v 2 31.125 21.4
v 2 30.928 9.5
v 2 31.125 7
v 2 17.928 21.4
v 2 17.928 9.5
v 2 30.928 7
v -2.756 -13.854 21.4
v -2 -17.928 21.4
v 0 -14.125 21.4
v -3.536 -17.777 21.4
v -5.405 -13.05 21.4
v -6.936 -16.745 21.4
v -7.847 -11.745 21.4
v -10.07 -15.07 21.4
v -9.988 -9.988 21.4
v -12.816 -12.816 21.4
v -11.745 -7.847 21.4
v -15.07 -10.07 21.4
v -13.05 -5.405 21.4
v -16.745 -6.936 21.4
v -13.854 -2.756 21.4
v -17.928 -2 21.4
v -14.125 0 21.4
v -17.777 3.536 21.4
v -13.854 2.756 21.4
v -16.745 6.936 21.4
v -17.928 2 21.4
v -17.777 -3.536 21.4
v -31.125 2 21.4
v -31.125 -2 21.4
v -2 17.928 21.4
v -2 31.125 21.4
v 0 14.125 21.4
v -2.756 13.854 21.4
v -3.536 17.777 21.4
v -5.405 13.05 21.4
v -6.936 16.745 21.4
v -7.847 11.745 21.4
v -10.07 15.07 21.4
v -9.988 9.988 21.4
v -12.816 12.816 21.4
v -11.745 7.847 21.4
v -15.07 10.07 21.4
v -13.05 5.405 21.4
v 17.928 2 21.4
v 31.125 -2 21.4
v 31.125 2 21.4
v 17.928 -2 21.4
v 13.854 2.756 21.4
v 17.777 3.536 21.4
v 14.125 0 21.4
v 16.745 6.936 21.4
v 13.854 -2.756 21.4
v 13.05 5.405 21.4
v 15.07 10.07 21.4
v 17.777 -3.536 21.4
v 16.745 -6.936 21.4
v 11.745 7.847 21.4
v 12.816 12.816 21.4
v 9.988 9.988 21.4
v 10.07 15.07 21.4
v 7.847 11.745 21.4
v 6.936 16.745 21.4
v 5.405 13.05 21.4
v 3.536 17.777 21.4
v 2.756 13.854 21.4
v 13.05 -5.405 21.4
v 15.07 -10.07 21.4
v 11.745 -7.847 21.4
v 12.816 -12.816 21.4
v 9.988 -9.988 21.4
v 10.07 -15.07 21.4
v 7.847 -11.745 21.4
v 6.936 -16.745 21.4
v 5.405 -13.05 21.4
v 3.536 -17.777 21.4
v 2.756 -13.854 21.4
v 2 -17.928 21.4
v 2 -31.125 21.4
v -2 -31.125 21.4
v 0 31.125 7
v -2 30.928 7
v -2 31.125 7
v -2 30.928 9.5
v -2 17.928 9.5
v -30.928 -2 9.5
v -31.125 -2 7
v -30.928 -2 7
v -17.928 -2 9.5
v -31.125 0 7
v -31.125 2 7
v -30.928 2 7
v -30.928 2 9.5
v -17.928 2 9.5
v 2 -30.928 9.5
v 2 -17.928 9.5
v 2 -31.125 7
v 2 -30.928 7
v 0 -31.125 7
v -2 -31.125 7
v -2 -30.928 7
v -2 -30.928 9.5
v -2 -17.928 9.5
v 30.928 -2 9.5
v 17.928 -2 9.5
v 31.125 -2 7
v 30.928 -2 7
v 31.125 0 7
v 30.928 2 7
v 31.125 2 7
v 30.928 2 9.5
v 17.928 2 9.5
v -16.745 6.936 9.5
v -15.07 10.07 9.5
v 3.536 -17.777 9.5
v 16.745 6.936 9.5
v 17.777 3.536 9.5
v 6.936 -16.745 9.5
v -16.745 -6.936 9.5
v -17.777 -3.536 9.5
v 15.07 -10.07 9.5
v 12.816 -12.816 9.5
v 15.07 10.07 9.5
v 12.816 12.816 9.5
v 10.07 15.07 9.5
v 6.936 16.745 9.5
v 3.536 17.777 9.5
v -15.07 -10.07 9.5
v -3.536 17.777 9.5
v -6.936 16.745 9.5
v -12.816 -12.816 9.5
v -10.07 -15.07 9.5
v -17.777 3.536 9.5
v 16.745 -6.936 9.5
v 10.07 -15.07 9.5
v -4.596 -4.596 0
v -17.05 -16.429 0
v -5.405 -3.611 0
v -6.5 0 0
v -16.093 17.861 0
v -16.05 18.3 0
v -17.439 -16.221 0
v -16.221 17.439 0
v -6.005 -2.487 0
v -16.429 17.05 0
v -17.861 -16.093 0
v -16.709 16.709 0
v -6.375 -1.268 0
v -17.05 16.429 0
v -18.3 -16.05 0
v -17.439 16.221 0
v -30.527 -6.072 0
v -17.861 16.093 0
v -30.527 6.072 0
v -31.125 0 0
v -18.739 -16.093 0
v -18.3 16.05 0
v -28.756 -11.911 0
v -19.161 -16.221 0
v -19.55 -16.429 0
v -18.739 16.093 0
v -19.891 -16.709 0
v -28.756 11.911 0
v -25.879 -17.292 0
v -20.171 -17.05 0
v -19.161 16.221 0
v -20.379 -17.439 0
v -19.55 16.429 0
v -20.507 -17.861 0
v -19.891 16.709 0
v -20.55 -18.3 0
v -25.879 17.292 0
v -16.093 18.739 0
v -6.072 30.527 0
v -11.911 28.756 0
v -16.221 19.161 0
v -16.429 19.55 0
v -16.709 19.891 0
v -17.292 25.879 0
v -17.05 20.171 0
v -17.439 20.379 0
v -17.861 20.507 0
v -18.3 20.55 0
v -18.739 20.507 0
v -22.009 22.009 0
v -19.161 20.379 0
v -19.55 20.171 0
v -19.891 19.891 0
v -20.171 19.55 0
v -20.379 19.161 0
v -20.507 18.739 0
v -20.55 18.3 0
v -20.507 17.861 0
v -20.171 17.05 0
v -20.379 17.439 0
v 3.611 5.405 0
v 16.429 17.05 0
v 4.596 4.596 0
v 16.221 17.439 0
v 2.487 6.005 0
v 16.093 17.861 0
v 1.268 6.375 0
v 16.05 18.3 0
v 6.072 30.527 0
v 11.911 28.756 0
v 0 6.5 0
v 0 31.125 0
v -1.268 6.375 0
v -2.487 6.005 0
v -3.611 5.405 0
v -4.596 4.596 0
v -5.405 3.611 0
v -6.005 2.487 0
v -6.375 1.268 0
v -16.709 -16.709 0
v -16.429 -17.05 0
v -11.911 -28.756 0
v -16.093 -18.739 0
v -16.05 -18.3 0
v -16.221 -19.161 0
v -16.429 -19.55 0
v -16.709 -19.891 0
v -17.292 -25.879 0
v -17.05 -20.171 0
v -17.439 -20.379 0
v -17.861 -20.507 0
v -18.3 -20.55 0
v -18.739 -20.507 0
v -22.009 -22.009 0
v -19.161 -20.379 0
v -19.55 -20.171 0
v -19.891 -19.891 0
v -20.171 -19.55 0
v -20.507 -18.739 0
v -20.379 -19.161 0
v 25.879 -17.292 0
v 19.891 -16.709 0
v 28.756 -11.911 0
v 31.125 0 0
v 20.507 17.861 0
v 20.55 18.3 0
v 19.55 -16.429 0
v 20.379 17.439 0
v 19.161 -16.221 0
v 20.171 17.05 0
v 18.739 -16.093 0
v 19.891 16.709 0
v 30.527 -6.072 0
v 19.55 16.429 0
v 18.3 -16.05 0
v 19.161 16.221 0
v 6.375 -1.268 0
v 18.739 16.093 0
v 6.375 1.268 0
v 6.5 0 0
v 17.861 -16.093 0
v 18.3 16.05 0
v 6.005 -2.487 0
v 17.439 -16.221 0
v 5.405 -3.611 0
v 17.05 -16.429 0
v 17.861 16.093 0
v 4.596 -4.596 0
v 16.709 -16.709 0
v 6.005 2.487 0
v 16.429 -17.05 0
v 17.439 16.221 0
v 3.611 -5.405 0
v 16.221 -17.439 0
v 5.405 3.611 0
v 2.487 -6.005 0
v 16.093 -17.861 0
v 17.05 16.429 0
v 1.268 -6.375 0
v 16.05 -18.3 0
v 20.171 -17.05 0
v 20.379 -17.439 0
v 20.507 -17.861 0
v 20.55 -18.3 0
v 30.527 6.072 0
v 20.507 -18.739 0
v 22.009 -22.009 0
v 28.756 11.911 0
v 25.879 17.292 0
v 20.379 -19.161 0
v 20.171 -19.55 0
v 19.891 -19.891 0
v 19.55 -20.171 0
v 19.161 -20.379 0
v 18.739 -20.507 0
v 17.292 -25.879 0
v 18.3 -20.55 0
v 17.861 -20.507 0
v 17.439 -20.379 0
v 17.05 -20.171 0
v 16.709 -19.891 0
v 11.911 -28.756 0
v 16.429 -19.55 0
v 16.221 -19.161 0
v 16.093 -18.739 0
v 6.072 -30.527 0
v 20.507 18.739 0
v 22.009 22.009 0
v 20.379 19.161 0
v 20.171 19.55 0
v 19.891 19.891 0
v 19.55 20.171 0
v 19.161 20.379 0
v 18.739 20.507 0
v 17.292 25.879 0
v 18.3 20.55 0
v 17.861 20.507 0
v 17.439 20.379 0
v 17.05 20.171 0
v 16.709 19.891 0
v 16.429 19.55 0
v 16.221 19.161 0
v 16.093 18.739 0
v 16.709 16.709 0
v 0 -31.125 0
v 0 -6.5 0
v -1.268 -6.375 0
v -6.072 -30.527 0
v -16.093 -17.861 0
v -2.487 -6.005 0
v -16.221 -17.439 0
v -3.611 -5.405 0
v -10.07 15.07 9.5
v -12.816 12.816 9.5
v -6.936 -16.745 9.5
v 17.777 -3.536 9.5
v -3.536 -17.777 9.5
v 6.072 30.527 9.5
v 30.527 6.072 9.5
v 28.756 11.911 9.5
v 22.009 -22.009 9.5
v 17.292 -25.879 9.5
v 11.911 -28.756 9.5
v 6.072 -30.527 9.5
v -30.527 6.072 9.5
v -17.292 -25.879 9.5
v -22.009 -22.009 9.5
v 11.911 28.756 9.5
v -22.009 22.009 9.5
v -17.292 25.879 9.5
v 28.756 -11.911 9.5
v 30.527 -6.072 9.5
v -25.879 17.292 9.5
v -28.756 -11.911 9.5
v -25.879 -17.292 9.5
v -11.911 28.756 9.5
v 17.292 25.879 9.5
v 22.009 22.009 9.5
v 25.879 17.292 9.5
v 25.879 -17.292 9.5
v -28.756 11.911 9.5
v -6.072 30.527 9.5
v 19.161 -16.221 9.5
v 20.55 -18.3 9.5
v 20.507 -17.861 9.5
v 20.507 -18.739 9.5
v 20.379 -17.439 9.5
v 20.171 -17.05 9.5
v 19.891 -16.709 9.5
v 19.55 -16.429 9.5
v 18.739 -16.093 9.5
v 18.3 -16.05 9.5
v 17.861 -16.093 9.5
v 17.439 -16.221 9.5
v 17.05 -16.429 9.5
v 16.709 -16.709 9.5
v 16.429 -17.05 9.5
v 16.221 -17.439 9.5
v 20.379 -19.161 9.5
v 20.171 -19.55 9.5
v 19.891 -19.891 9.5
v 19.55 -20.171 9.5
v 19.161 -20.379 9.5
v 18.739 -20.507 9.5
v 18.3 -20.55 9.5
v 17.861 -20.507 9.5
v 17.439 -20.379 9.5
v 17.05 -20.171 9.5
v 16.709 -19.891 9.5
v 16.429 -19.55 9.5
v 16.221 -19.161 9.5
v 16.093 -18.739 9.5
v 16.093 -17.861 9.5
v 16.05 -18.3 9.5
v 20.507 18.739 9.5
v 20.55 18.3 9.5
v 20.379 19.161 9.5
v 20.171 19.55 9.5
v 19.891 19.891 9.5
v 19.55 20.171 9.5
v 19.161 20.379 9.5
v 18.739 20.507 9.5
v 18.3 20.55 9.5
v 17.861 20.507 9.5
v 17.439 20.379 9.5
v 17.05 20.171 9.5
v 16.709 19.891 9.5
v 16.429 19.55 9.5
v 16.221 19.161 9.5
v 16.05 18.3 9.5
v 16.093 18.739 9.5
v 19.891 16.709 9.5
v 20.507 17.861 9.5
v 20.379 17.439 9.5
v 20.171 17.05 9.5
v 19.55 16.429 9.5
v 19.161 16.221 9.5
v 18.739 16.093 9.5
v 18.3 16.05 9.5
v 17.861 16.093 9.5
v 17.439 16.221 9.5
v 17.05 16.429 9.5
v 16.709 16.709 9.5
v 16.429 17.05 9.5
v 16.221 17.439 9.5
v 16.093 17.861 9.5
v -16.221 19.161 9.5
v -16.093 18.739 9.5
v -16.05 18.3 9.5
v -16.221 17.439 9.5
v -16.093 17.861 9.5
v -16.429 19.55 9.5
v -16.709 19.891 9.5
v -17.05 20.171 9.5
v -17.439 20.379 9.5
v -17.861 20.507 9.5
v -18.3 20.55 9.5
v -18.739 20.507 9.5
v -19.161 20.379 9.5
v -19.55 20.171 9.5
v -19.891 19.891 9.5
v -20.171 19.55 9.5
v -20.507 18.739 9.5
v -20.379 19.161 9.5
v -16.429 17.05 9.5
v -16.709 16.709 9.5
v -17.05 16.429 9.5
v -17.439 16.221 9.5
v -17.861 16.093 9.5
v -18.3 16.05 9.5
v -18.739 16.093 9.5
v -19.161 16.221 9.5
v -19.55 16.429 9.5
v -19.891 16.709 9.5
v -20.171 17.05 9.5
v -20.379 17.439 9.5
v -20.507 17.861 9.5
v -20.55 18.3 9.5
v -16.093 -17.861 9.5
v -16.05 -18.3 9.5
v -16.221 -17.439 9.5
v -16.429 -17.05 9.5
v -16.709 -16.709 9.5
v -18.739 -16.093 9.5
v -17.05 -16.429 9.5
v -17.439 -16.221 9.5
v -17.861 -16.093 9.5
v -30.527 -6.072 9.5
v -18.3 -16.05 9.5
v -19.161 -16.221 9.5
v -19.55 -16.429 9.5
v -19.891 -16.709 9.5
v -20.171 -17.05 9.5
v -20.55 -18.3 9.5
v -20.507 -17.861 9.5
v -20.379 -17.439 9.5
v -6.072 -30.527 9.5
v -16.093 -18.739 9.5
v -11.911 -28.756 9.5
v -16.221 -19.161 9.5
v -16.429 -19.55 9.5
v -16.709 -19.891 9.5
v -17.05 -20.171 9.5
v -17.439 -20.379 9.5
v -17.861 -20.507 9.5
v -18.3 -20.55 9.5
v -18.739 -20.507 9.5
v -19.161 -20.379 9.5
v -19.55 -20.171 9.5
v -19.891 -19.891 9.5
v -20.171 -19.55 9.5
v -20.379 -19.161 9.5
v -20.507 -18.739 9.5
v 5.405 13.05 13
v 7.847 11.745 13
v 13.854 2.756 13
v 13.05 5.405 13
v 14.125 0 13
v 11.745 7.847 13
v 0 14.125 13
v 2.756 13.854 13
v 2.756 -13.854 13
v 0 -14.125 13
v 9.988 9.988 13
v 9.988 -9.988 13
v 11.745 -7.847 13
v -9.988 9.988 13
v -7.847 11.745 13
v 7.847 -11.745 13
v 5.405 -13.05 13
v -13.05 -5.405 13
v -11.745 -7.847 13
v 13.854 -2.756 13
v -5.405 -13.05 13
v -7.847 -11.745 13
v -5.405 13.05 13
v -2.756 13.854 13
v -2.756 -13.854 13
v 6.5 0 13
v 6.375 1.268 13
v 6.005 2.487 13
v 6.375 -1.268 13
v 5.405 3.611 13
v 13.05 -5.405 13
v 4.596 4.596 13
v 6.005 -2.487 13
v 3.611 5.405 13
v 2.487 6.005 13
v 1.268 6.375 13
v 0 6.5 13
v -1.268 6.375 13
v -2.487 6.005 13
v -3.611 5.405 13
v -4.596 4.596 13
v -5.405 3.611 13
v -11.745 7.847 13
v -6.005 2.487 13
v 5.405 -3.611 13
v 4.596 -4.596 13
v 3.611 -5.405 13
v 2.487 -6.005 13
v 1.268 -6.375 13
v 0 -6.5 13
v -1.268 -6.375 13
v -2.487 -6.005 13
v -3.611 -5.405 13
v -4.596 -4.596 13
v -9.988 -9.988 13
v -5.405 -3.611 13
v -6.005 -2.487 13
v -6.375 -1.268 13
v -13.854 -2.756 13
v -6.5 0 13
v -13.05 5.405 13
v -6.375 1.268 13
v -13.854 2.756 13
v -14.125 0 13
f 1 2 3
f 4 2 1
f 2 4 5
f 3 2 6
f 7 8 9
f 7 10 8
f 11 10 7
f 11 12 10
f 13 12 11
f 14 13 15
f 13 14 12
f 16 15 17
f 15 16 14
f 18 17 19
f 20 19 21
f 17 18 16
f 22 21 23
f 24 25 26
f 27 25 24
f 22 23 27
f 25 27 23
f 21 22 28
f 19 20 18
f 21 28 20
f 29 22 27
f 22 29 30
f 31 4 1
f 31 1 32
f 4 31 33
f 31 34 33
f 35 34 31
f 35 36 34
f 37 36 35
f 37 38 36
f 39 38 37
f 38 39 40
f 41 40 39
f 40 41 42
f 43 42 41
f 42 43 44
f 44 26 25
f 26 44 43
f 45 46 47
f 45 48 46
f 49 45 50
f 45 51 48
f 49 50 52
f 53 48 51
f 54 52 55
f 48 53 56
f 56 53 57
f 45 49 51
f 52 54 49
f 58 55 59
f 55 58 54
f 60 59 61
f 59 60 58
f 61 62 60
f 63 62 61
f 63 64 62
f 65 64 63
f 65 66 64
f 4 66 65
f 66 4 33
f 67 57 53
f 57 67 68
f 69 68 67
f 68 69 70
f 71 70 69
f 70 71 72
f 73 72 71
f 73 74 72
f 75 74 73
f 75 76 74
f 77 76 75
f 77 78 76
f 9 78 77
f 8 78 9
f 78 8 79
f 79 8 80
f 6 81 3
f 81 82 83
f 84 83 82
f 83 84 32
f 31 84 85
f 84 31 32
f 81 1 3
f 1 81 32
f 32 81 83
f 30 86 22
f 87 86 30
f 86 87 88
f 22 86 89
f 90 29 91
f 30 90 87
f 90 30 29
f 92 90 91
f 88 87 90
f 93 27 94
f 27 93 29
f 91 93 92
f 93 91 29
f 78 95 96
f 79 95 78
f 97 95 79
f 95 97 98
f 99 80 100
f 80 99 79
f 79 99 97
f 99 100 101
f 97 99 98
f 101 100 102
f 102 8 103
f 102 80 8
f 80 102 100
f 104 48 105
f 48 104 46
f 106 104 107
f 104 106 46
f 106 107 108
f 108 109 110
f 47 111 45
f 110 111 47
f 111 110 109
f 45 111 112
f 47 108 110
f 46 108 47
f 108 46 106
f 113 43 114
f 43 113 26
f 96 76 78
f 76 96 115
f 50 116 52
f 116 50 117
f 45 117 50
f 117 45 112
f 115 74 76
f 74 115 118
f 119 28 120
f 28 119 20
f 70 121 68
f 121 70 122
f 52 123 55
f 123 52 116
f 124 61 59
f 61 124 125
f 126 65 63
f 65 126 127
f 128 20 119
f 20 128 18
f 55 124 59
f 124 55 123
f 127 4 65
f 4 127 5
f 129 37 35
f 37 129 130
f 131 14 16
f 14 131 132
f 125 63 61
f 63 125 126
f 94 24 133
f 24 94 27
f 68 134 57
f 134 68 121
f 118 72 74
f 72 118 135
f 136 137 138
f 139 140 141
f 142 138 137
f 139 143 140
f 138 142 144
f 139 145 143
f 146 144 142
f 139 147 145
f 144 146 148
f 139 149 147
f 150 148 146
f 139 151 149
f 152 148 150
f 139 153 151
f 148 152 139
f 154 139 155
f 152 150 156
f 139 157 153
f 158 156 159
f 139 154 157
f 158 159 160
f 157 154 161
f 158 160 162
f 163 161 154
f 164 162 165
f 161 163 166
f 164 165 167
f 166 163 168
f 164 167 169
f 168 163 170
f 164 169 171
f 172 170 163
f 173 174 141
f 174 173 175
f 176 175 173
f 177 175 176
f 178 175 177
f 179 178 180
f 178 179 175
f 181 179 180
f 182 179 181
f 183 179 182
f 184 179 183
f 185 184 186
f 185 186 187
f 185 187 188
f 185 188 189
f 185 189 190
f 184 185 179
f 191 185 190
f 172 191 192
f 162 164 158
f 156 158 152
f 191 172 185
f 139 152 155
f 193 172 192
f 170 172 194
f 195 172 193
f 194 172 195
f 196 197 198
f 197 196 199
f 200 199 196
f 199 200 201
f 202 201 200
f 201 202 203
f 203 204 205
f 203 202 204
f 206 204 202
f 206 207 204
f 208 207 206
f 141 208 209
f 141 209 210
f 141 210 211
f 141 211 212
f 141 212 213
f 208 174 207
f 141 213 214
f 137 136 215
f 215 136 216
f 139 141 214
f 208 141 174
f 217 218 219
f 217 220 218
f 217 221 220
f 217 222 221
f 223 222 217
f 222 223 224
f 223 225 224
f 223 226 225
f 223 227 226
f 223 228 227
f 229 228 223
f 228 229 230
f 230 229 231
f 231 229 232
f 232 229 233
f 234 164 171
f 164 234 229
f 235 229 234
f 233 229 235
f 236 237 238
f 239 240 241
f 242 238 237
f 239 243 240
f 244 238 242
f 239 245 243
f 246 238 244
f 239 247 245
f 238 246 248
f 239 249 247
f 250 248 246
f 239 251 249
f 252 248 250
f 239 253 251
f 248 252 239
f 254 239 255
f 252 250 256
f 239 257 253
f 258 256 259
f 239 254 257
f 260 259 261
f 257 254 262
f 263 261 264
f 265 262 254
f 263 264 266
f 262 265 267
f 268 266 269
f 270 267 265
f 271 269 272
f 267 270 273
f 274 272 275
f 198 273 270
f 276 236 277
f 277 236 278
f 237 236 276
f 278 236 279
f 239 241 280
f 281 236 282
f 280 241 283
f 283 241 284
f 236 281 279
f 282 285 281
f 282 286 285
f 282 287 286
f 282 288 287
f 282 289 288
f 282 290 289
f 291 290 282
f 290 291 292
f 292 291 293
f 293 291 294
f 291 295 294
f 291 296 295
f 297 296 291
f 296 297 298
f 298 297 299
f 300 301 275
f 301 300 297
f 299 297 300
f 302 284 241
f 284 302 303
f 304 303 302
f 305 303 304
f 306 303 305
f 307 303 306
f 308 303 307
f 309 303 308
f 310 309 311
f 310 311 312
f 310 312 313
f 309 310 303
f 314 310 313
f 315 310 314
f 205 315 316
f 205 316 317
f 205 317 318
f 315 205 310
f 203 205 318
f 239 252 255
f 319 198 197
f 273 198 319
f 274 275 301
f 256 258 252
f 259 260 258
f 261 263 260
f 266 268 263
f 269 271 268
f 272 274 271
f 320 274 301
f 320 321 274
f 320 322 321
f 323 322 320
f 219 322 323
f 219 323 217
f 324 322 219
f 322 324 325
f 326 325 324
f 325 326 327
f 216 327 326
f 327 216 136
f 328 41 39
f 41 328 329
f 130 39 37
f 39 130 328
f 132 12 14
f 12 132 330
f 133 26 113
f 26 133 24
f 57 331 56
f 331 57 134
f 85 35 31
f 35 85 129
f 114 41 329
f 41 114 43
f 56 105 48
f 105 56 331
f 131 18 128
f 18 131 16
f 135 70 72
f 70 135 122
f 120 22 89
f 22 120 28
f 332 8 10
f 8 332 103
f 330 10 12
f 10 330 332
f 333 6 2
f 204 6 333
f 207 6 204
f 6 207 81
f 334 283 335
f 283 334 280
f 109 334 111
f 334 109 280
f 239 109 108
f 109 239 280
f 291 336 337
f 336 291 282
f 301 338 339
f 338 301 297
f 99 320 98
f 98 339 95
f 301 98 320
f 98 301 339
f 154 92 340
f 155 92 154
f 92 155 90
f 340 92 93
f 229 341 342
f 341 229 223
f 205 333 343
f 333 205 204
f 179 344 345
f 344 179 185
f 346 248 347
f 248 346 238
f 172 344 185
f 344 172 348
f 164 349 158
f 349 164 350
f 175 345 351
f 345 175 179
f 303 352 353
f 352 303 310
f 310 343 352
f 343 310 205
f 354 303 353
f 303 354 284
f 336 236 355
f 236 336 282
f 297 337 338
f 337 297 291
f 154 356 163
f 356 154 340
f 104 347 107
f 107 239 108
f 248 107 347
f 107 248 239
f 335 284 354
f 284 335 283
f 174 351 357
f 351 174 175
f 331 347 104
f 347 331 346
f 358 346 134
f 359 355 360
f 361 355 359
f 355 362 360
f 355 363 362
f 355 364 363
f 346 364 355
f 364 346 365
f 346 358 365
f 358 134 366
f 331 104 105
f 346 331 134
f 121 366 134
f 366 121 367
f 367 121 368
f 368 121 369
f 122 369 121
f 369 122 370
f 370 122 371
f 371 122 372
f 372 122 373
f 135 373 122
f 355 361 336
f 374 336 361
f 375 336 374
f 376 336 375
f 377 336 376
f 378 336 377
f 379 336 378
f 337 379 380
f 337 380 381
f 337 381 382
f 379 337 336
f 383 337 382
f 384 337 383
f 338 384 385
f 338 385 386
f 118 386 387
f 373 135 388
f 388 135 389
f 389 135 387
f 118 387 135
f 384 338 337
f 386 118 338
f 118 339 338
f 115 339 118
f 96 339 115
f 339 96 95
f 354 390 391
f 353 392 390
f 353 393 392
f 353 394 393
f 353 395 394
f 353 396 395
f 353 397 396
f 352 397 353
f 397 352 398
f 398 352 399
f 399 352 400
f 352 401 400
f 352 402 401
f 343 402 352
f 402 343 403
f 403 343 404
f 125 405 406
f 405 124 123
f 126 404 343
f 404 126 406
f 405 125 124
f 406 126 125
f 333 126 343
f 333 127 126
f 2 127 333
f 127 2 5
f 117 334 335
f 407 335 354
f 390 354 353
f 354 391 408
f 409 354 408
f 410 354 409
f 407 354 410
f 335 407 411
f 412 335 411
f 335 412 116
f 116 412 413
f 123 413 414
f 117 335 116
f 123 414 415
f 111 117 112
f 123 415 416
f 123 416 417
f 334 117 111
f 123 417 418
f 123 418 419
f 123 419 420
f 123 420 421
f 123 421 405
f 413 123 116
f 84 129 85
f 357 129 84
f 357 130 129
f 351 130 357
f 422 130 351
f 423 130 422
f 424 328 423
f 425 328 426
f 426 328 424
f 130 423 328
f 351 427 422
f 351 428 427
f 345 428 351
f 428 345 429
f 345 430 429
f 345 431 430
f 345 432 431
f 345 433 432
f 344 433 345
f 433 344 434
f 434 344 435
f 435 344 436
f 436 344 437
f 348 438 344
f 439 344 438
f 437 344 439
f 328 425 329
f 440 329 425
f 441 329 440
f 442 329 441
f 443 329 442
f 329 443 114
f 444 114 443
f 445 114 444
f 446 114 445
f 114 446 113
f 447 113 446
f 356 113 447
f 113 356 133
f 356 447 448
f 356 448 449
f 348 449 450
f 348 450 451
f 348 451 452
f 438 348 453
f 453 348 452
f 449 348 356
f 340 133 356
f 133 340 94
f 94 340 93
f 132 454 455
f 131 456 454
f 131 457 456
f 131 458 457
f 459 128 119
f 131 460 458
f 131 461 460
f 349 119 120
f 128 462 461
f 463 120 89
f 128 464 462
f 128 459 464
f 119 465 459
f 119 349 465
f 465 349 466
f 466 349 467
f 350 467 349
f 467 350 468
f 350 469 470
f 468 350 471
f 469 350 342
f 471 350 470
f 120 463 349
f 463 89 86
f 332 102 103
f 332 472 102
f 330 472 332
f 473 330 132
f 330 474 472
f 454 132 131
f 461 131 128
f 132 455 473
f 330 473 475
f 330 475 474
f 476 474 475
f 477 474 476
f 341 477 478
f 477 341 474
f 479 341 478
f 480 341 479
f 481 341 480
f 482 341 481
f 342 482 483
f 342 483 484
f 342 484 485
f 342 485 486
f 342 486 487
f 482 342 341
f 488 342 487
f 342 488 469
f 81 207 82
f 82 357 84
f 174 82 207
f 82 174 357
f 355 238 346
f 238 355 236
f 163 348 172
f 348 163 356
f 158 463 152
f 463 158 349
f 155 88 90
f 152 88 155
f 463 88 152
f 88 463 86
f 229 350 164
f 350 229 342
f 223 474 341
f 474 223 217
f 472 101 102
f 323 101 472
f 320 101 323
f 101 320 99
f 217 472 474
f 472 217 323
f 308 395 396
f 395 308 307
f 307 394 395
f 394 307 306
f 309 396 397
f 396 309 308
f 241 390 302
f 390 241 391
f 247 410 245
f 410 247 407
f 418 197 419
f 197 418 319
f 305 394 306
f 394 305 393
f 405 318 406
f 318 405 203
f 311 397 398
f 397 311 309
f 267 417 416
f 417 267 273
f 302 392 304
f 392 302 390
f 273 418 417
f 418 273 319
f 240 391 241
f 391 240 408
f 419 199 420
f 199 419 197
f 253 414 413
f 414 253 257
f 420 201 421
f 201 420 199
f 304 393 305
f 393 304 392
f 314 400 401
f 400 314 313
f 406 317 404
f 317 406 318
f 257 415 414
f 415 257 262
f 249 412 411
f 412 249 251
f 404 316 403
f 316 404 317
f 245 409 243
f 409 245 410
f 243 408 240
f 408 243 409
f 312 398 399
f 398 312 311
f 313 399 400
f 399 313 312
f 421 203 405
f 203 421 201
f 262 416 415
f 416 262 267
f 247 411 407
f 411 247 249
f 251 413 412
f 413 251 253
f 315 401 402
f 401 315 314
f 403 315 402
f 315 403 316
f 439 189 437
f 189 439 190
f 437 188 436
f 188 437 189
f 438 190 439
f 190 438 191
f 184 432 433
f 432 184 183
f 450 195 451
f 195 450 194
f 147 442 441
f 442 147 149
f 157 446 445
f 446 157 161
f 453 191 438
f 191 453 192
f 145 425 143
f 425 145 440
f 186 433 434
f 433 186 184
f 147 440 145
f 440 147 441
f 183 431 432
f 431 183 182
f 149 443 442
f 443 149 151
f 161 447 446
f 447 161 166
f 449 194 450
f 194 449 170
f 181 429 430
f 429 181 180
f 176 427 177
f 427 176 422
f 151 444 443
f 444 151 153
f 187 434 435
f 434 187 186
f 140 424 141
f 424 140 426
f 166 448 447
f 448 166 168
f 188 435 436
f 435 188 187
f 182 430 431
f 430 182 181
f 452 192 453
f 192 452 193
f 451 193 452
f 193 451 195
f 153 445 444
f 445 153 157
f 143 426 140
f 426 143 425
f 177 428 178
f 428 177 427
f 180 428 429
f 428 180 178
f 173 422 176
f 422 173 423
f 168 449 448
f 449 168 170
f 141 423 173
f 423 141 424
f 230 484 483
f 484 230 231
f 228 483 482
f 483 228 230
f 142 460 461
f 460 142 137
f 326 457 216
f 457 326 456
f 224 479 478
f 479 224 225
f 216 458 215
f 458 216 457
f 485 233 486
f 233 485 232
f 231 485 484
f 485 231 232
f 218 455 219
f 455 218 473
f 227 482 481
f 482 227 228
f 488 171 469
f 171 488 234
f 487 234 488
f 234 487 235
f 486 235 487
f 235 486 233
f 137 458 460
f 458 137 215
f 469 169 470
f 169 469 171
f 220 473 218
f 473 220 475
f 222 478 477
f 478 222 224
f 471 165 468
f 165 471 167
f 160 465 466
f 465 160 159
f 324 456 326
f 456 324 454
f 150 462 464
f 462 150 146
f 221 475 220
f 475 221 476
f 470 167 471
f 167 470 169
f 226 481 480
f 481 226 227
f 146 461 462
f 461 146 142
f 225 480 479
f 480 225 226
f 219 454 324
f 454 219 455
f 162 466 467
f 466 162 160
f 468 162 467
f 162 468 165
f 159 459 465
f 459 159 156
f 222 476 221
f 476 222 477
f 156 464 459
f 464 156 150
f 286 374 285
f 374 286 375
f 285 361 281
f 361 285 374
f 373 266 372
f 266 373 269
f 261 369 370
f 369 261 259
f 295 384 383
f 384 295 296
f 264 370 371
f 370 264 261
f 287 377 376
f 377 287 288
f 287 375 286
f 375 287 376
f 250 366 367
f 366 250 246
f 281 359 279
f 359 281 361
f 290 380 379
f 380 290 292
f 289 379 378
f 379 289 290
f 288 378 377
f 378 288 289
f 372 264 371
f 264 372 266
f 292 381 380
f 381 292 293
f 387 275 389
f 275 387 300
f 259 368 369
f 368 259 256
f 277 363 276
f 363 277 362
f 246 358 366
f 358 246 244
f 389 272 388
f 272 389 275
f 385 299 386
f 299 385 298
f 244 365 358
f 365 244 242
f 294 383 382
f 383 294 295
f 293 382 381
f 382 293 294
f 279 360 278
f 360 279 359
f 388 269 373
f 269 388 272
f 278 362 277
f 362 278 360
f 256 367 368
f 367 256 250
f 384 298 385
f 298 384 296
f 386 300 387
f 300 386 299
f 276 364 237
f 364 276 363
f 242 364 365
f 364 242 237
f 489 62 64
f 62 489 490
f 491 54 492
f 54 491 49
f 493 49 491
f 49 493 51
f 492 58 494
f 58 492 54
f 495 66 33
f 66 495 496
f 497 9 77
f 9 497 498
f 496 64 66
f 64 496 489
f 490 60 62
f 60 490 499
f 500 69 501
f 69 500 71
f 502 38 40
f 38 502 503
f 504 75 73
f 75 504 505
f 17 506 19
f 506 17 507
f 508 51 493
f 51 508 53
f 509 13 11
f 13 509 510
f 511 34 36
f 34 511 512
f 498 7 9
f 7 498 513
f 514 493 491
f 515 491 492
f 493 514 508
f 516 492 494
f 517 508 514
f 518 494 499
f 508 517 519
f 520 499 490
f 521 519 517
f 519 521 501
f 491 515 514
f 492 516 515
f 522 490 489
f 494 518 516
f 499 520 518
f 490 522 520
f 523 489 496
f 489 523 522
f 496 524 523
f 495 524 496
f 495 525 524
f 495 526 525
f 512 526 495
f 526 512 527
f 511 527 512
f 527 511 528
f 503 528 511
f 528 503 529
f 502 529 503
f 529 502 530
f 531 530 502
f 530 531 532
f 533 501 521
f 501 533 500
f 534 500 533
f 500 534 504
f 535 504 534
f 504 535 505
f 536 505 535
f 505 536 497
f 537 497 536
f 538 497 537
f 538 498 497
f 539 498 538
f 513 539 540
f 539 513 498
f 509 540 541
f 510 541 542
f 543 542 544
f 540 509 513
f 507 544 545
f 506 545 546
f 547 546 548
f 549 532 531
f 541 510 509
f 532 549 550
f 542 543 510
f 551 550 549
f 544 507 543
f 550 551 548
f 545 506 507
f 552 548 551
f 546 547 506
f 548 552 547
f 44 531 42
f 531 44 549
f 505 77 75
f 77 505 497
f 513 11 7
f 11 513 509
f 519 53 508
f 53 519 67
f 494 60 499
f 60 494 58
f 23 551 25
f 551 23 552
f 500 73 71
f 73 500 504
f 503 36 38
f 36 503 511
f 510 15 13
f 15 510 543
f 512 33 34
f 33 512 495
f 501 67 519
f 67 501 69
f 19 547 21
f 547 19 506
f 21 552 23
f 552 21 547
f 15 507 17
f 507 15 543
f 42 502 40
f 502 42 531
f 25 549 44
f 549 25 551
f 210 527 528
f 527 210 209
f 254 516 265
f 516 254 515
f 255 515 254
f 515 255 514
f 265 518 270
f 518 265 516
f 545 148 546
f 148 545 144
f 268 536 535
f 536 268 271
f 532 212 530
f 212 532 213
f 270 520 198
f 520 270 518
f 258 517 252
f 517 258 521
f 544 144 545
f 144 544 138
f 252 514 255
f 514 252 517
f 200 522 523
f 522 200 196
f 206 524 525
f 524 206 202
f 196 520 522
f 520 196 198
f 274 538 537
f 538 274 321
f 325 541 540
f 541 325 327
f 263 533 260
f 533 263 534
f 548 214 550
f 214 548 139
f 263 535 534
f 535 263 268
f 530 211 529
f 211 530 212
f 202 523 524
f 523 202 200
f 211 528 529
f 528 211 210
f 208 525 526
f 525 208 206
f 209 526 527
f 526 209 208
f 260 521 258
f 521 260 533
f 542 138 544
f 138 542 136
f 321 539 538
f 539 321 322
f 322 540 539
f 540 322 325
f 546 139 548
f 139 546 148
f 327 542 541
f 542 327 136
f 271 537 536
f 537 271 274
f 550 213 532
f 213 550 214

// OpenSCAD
$fn = 32;

// ----------------------------------------------------------------------
// Bearing housing: seat for 6001 (28 x 8 mm), 36.25 mm body
// ----------------------------------------------------------------------

// --- parameters (mm) ---
body_od = 36.25;          // housing outside diameter
body_h = 21.4;            // overall housing height
wall = 4;                 // wall thickness
pocket_d = 28.25;         // 6001 seat, 0.25 mm clearance
seat_h = 8.4;             // pocket depth
shoulder = 5;             // shoulder under the bearing
pass_d = 13;              // shaft passage
flange_dia = 62.25;       // mounting flange diameter
flange_t = 8;             // flange thickness
bolt_d = 4.5;             // flange bolt clearance
bolt_r = 25.88;           // flange bolt circle radius
rib_w = 4;                // rib width
rib_n = 4;                // rib count

module body() {
  cylinder(h = body_h, d = body_od);
}

module flange() {
  /* flange sunk 1.5 mm into the body */
  cylinder(h = flange_t + 1.5, d = flange_dia);
}

module ribs() {
  for (i = [0 : rib_n - 1])
    rotate([0, 0, i * 360 / rib_n])
      translate([-rib_w / 2, body_od / 2 - 0.8, flange_t - 1])
        cube([rib_w, (flange_dia - body_od) / 2 + 0.8, body_h - flange_t + 1]);
}

difference() {
  union() {
    body();
    flange();
    ribs();
  }
  translate([0, 0, body_h - seat_h]) cylinder(h = seat_h + 1, d = pocket_d);
  translate([0, 0, -1]) cylinder(h = body_h - seat_h + 1, d = pass_d);
  for (i = [0 : 3]) rotate([0, 0, 45 + i * 90]) translate([bolt_r, 0, -1])
    cylinder(h = flange_t + 3, d = bolt_d);
}
